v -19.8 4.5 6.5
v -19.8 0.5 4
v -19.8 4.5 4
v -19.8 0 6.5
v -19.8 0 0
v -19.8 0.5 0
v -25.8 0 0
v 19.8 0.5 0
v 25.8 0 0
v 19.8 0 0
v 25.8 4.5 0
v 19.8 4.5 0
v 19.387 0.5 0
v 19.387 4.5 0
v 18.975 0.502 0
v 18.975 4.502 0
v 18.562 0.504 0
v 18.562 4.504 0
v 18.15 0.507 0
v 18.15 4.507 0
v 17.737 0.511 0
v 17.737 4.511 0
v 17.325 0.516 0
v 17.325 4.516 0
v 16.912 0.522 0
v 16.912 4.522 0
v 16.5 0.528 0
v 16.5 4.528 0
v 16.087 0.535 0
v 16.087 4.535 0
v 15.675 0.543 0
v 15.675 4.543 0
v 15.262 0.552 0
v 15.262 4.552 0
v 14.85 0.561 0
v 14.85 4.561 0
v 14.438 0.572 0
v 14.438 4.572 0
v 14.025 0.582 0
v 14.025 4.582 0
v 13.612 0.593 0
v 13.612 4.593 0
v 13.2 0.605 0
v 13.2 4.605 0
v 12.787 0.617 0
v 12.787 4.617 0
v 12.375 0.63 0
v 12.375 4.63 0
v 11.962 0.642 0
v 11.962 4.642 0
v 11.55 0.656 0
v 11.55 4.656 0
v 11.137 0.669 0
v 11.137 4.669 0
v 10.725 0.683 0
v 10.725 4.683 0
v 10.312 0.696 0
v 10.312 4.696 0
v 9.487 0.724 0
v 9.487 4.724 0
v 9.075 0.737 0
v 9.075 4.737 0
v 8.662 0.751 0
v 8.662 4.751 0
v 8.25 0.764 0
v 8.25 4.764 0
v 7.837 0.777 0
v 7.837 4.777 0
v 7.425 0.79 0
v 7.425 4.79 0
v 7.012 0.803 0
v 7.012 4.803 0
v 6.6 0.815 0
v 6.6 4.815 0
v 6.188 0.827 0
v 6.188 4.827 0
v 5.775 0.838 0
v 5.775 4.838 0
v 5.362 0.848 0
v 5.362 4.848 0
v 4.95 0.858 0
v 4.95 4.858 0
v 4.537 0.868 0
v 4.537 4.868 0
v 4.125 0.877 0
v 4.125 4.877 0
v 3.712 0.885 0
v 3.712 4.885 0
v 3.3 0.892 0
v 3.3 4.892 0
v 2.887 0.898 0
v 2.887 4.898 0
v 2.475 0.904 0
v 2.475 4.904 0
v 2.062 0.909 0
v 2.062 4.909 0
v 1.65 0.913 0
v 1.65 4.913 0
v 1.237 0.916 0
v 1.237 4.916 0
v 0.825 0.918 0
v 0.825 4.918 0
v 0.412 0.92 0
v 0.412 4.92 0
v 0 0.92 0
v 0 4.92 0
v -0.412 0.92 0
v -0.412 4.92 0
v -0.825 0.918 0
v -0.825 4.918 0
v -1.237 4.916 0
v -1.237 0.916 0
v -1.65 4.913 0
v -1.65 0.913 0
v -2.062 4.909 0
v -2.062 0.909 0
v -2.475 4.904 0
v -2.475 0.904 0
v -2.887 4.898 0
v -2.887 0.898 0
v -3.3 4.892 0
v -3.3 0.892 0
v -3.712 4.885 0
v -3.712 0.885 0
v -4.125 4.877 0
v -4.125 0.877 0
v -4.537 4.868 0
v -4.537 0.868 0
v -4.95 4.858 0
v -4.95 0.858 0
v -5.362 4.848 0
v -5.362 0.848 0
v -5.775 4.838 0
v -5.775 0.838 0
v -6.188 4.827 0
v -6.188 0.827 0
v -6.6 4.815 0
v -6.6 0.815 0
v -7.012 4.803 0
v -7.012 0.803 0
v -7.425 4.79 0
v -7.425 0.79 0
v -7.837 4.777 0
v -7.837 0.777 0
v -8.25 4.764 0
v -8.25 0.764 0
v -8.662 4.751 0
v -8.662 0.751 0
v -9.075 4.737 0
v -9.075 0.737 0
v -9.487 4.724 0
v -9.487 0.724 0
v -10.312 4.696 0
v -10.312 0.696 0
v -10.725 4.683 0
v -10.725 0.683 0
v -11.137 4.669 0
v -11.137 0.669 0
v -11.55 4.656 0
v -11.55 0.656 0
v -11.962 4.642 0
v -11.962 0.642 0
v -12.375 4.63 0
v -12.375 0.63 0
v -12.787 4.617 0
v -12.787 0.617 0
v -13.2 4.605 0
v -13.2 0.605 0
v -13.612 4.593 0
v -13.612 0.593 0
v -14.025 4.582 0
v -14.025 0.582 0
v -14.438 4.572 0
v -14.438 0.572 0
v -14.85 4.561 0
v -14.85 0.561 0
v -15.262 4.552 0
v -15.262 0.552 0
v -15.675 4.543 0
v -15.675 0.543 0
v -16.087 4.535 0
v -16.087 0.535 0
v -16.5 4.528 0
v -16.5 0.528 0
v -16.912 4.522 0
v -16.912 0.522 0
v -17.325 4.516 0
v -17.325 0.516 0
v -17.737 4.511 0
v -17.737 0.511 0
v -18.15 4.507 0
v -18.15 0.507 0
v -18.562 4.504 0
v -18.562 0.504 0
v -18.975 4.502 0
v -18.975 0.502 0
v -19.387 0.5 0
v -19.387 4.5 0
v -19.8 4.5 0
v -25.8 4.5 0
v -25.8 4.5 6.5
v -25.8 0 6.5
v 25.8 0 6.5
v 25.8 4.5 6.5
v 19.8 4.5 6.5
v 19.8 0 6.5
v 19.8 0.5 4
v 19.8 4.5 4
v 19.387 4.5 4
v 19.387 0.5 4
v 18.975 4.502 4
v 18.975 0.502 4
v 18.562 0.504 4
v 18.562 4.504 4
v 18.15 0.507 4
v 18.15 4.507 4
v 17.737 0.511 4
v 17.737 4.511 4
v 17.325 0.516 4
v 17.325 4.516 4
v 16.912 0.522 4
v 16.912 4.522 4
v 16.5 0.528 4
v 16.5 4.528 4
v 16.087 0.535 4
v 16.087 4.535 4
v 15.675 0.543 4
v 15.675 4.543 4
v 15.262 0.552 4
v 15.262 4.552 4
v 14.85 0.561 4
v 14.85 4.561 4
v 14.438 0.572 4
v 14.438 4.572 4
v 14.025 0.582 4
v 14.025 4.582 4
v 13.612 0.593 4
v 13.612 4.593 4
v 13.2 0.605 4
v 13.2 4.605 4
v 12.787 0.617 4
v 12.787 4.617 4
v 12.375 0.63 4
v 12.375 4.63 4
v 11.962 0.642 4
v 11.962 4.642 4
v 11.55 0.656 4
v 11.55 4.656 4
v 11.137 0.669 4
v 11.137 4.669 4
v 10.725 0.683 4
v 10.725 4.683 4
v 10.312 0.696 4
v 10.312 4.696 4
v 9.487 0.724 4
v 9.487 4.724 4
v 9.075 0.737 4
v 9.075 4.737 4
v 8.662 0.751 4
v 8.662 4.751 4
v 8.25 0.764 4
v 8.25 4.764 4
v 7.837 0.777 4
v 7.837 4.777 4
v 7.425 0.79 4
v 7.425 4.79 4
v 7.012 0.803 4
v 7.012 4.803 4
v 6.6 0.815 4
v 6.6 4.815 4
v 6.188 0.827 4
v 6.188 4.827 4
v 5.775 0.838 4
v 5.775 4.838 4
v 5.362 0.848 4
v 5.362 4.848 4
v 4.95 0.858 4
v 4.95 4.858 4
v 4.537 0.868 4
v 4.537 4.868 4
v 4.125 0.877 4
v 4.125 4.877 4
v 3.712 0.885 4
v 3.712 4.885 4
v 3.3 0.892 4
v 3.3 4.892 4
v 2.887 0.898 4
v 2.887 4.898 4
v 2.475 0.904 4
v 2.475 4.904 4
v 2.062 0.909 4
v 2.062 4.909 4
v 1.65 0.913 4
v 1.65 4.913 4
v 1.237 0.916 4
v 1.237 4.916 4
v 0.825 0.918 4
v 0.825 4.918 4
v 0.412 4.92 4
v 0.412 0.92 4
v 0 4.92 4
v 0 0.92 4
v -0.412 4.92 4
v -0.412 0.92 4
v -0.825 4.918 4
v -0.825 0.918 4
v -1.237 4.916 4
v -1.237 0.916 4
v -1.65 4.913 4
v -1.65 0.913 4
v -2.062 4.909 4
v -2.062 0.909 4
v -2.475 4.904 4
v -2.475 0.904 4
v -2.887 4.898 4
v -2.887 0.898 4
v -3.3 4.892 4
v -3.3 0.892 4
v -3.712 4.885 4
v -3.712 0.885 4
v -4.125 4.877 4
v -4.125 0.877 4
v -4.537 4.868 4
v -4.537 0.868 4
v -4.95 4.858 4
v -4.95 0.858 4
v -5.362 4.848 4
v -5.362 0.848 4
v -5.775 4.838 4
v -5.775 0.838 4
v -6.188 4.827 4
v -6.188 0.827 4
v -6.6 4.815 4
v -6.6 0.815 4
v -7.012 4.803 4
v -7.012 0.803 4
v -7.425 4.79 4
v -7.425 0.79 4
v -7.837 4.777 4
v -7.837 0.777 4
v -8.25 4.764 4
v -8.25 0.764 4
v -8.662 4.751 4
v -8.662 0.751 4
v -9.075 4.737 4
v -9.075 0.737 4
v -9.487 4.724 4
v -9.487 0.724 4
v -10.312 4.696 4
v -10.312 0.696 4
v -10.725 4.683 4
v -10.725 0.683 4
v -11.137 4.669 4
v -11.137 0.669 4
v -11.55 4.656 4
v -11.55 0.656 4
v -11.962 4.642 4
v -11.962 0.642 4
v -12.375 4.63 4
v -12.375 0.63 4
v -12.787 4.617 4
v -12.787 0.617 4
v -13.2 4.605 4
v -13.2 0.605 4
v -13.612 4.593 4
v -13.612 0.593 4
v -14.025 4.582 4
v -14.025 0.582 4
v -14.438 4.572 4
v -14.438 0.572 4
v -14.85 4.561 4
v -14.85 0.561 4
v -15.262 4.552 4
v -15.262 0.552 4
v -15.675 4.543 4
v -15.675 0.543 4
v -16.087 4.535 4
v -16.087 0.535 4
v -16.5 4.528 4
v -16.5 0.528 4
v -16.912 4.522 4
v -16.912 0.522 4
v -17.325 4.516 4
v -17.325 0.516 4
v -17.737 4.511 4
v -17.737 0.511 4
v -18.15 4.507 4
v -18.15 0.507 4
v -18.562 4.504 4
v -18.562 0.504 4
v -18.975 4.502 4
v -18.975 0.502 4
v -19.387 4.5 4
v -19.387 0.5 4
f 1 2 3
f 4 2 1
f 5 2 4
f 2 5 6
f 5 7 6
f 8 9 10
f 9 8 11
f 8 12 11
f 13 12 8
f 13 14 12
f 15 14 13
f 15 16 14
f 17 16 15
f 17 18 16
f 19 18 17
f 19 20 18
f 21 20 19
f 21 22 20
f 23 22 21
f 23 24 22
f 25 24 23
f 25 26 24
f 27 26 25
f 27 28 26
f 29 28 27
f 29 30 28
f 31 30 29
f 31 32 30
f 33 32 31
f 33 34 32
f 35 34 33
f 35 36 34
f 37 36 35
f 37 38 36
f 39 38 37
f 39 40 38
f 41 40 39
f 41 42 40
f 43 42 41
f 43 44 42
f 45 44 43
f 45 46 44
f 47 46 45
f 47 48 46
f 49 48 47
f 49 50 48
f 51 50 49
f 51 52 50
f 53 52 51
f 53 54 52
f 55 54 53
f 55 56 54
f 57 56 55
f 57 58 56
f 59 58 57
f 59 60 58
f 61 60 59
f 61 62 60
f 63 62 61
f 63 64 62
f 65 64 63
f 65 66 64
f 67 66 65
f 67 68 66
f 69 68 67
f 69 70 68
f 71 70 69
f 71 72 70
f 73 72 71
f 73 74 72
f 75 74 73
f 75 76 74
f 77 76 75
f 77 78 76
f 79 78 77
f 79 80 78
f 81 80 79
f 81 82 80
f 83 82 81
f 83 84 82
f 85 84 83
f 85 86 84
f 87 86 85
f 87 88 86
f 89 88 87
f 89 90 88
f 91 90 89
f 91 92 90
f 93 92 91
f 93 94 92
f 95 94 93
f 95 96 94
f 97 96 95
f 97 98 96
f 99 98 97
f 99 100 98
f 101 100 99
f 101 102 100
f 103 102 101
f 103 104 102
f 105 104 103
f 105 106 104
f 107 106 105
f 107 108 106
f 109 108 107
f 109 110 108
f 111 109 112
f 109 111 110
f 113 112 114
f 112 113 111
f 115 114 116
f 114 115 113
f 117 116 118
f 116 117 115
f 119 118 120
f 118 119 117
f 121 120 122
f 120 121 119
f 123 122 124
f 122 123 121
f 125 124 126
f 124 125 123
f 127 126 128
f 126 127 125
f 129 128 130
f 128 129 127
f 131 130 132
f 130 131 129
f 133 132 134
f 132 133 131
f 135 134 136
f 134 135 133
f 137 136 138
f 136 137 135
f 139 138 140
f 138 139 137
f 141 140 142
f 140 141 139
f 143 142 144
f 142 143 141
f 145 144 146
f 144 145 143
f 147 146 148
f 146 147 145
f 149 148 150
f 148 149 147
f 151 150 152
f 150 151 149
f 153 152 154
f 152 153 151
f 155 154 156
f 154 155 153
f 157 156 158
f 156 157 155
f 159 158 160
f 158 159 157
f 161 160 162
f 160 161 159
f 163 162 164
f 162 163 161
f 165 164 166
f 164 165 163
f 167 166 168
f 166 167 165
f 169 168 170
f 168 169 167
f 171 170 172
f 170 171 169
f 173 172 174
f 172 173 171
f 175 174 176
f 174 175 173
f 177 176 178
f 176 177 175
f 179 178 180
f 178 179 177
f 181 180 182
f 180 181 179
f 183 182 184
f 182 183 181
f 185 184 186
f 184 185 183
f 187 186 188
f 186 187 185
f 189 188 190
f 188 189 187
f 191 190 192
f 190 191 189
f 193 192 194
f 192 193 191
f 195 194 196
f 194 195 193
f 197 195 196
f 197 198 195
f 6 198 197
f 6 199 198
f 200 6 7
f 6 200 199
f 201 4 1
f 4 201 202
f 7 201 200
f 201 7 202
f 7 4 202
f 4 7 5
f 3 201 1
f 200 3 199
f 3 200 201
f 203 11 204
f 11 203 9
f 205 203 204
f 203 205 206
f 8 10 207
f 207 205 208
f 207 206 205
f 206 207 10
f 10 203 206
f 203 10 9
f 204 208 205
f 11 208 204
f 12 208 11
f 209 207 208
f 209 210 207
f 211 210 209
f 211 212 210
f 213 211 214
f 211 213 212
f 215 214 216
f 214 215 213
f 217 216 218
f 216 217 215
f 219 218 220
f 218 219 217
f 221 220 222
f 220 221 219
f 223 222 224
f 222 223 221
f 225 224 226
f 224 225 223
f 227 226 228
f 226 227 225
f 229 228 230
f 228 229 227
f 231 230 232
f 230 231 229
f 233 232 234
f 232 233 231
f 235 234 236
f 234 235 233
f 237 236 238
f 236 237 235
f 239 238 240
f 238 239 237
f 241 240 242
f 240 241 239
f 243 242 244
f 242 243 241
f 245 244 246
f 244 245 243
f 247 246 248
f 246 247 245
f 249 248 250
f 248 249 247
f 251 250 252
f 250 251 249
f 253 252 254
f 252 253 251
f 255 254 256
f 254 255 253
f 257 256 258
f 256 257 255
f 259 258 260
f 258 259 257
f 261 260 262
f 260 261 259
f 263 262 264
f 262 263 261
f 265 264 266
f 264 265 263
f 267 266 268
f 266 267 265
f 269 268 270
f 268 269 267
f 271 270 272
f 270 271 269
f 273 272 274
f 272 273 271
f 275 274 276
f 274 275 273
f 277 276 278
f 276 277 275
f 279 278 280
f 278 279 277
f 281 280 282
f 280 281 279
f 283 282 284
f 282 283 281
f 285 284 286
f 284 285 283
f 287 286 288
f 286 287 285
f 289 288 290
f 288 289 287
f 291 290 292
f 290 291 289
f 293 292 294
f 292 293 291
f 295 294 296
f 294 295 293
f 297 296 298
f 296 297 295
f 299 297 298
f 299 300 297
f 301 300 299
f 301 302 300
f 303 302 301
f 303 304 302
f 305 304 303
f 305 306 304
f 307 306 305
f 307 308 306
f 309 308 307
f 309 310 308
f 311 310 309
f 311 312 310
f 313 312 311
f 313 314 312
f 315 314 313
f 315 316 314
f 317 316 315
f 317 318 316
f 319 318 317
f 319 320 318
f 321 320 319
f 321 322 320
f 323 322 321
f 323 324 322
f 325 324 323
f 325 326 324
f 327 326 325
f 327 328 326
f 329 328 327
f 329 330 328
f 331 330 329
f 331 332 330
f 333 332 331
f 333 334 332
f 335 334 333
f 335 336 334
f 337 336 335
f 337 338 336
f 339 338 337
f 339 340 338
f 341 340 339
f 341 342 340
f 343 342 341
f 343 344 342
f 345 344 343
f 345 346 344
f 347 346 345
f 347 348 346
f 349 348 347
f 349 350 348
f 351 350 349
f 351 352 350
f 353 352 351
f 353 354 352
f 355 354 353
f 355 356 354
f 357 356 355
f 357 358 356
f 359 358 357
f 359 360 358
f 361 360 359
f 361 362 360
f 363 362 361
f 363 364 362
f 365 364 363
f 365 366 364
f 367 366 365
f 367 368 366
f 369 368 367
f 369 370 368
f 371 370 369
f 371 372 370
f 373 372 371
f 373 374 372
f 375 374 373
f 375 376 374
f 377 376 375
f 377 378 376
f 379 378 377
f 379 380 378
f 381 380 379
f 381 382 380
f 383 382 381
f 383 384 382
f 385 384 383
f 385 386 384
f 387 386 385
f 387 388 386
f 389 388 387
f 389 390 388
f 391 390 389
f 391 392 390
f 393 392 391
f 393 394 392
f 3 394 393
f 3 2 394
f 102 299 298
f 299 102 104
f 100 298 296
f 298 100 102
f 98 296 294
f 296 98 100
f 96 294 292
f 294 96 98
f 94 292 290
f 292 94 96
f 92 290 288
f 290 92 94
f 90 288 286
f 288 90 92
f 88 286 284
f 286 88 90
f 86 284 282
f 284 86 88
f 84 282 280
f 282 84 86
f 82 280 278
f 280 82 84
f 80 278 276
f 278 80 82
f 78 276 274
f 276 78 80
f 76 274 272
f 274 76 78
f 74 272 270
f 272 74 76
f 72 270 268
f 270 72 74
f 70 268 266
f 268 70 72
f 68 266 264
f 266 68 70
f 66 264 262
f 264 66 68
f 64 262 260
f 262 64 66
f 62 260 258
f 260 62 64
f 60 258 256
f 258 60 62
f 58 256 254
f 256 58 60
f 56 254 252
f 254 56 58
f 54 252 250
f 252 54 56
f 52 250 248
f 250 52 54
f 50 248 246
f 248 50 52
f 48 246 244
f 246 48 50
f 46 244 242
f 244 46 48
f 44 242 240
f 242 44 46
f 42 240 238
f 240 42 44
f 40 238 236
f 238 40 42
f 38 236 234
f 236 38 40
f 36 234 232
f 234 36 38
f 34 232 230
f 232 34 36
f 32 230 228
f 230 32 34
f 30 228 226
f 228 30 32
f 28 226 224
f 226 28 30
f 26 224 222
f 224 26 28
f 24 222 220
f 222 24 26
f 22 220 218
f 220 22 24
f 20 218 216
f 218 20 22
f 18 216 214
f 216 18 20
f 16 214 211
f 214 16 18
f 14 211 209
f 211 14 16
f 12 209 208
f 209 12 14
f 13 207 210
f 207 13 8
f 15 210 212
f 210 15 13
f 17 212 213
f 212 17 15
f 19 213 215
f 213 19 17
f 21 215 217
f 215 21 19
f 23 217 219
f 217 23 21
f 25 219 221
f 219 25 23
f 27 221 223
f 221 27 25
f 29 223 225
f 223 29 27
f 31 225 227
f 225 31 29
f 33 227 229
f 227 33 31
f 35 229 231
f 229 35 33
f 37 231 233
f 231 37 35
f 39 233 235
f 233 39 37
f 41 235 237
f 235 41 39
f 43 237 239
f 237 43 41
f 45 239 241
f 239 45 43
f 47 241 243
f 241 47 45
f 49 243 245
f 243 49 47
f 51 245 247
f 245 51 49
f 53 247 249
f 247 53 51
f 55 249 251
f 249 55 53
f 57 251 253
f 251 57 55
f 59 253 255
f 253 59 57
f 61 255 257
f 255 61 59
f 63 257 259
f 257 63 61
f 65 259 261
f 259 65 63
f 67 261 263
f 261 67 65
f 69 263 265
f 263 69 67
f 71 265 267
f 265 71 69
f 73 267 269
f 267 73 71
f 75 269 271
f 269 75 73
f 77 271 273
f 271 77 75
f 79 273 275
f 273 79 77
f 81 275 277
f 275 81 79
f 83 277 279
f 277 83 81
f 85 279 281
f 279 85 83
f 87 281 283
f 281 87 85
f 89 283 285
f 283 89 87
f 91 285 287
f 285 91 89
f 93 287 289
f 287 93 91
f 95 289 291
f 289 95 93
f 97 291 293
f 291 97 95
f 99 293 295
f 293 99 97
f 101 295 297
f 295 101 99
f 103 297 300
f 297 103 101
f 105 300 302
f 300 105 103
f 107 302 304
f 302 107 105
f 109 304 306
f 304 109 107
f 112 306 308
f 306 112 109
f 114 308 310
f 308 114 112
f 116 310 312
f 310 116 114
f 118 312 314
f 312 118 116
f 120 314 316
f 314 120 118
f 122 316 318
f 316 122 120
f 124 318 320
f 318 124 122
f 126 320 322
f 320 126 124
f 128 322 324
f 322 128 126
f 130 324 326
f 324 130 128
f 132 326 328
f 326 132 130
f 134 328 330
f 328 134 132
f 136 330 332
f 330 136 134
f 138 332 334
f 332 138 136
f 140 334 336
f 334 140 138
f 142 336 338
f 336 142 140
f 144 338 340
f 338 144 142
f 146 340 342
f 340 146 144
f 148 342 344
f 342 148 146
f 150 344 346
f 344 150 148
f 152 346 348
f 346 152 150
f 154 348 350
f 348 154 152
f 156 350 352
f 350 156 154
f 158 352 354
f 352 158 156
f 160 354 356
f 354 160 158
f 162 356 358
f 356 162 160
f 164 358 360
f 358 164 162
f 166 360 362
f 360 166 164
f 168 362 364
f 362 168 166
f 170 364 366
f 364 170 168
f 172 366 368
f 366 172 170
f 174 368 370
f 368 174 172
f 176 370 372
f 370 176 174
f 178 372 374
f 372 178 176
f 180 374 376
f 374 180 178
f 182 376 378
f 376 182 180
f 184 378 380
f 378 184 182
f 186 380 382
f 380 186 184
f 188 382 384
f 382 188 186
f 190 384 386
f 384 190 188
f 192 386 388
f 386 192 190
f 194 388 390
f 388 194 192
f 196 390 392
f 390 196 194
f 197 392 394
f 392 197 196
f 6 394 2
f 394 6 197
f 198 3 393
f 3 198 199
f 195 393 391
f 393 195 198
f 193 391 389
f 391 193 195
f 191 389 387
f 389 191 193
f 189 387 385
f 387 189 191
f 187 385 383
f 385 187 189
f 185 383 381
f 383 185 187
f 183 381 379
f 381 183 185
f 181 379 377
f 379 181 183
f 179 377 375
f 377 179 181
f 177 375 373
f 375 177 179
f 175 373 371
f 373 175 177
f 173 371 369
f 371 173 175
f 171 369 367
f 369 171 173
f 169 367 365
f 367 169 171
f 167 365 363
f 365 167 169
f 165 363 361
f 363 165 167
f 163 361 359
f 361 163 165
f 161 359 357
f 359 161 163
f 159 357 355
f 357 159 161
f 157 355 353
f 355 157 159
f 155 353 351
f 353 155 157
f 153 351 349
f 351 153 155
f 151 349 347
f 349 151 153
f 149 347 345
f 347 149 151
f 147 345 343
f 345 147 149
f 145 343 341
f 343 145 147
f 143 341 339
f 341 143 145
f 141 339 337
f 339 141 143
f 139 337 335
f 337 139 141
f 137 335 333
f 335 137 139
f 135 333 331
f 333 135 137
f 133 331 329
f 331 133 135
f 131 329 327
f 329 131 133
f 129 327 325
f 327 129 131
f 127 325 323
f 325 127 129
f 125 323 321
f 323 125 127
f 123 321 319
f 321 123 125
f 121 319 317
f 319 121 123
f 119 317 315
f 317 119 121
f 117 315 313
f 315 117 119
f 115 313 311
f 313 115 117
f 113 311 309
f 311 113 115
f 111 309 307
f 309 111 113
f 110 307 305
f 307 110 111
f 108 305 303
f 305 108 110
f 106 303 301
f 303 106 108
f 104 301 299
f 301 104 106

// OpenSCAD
// spring — the wave spring that clamps every letter in the deck groove.
// One per platform, printed separately and fitted once; it then stays put.
//
// The groove is deliberately wider than a letter. This lives down one side of
// it and presses each letter against the opposite wall. Letters stay a plain
// drop-in — nothing has to be removed to change one.
//
// Why a spring and not a sized slot: four straight-slot fits were printed
// (0.5, 0.2, 0.05 and 0.0 mm a side) and every one came out loose, because a
// straight slot's grip IS the print tolerance — neither the letter nor the deck
// can give. A spring gives, and delivers much the same force anywhere in its
// travel, so the fit stops depending on hitting a dimension.
//
// It flexes IN THE PRINT PLANE: the strip runs along the groove and bends across
// it, so the bending stress runs along the layer lines rather than across them.
// That is the exact opposite of the wheel peg's failure, and it is what lets
// this be 1 mm thin without being fragile.

include <../../lib/common.scad>

spring_span  = spring_l - 2 * spring_anchor_l;              // 35.6
spring_bow   = spring_preload + spring_recess;              // 0.92
spring_front = -(spring_space - spring_recess);             // anchors' front face

// The bow: 1 at mid-span, 0 at each anchor.
function bow(x) = 0.5 + 0.5 * cos(360 * x / spring_span);

// Plan outline. y = 0 is the back, against the groove wall. Anchors at the two
// ends run right back to it; between them the leaf bows toward the letter and is
// clear of the wall so it can deflect.
module spring_2d(n = 96) {
    fx = [for (i = [0:n]) -spring_span/2 + spring_span * i / n];
    back  = concat([[-spring_l/2, 0]],
                   [for (x = fx) [x, spring_front - spring_bow * bow(x) + spring_t]],
                   [[spring_l/2, 0]]);
    front = concat([[spring_l/2, spring_front]],
                   [for (i = [n:-1:0]) let (x = fx[i])
                        [x, spring_front - spring_bow * bow(x)]],
                   [[-spring_l/2, spring_front]]);
    polygon(concat(back, front));
}

// The spring in USE coordinates: back face on y = 0, top face on z = 0.
module spring_solid() {
    translate([0, 0, -letter_slot_d]) linear_extrude(letter_slot_d) spring_2d();
    // the anchors continue down into their pockets
    for (s = [-1, 1])
        translate([s > 0 ? spring_span/2 : -spring_l/2, spring_front,
                   -letter_slot_d - spring_leg_l])
            cube([spring_anchor_l, -spring_front, letter_slot_d + spring_leg_l]);
}

// Where it sits in a chassis, for fit checks.
module spring_fitted() {
    translate([0, letter_slot_w/2, body_top]) spring_solid();
}

// Printed upside down, so the face that finishes flush with the deck is the one
// on the bed and everything else grows upward off it — no overhang anywhere.
rotate([180, 0, 0]) spring_solid();
